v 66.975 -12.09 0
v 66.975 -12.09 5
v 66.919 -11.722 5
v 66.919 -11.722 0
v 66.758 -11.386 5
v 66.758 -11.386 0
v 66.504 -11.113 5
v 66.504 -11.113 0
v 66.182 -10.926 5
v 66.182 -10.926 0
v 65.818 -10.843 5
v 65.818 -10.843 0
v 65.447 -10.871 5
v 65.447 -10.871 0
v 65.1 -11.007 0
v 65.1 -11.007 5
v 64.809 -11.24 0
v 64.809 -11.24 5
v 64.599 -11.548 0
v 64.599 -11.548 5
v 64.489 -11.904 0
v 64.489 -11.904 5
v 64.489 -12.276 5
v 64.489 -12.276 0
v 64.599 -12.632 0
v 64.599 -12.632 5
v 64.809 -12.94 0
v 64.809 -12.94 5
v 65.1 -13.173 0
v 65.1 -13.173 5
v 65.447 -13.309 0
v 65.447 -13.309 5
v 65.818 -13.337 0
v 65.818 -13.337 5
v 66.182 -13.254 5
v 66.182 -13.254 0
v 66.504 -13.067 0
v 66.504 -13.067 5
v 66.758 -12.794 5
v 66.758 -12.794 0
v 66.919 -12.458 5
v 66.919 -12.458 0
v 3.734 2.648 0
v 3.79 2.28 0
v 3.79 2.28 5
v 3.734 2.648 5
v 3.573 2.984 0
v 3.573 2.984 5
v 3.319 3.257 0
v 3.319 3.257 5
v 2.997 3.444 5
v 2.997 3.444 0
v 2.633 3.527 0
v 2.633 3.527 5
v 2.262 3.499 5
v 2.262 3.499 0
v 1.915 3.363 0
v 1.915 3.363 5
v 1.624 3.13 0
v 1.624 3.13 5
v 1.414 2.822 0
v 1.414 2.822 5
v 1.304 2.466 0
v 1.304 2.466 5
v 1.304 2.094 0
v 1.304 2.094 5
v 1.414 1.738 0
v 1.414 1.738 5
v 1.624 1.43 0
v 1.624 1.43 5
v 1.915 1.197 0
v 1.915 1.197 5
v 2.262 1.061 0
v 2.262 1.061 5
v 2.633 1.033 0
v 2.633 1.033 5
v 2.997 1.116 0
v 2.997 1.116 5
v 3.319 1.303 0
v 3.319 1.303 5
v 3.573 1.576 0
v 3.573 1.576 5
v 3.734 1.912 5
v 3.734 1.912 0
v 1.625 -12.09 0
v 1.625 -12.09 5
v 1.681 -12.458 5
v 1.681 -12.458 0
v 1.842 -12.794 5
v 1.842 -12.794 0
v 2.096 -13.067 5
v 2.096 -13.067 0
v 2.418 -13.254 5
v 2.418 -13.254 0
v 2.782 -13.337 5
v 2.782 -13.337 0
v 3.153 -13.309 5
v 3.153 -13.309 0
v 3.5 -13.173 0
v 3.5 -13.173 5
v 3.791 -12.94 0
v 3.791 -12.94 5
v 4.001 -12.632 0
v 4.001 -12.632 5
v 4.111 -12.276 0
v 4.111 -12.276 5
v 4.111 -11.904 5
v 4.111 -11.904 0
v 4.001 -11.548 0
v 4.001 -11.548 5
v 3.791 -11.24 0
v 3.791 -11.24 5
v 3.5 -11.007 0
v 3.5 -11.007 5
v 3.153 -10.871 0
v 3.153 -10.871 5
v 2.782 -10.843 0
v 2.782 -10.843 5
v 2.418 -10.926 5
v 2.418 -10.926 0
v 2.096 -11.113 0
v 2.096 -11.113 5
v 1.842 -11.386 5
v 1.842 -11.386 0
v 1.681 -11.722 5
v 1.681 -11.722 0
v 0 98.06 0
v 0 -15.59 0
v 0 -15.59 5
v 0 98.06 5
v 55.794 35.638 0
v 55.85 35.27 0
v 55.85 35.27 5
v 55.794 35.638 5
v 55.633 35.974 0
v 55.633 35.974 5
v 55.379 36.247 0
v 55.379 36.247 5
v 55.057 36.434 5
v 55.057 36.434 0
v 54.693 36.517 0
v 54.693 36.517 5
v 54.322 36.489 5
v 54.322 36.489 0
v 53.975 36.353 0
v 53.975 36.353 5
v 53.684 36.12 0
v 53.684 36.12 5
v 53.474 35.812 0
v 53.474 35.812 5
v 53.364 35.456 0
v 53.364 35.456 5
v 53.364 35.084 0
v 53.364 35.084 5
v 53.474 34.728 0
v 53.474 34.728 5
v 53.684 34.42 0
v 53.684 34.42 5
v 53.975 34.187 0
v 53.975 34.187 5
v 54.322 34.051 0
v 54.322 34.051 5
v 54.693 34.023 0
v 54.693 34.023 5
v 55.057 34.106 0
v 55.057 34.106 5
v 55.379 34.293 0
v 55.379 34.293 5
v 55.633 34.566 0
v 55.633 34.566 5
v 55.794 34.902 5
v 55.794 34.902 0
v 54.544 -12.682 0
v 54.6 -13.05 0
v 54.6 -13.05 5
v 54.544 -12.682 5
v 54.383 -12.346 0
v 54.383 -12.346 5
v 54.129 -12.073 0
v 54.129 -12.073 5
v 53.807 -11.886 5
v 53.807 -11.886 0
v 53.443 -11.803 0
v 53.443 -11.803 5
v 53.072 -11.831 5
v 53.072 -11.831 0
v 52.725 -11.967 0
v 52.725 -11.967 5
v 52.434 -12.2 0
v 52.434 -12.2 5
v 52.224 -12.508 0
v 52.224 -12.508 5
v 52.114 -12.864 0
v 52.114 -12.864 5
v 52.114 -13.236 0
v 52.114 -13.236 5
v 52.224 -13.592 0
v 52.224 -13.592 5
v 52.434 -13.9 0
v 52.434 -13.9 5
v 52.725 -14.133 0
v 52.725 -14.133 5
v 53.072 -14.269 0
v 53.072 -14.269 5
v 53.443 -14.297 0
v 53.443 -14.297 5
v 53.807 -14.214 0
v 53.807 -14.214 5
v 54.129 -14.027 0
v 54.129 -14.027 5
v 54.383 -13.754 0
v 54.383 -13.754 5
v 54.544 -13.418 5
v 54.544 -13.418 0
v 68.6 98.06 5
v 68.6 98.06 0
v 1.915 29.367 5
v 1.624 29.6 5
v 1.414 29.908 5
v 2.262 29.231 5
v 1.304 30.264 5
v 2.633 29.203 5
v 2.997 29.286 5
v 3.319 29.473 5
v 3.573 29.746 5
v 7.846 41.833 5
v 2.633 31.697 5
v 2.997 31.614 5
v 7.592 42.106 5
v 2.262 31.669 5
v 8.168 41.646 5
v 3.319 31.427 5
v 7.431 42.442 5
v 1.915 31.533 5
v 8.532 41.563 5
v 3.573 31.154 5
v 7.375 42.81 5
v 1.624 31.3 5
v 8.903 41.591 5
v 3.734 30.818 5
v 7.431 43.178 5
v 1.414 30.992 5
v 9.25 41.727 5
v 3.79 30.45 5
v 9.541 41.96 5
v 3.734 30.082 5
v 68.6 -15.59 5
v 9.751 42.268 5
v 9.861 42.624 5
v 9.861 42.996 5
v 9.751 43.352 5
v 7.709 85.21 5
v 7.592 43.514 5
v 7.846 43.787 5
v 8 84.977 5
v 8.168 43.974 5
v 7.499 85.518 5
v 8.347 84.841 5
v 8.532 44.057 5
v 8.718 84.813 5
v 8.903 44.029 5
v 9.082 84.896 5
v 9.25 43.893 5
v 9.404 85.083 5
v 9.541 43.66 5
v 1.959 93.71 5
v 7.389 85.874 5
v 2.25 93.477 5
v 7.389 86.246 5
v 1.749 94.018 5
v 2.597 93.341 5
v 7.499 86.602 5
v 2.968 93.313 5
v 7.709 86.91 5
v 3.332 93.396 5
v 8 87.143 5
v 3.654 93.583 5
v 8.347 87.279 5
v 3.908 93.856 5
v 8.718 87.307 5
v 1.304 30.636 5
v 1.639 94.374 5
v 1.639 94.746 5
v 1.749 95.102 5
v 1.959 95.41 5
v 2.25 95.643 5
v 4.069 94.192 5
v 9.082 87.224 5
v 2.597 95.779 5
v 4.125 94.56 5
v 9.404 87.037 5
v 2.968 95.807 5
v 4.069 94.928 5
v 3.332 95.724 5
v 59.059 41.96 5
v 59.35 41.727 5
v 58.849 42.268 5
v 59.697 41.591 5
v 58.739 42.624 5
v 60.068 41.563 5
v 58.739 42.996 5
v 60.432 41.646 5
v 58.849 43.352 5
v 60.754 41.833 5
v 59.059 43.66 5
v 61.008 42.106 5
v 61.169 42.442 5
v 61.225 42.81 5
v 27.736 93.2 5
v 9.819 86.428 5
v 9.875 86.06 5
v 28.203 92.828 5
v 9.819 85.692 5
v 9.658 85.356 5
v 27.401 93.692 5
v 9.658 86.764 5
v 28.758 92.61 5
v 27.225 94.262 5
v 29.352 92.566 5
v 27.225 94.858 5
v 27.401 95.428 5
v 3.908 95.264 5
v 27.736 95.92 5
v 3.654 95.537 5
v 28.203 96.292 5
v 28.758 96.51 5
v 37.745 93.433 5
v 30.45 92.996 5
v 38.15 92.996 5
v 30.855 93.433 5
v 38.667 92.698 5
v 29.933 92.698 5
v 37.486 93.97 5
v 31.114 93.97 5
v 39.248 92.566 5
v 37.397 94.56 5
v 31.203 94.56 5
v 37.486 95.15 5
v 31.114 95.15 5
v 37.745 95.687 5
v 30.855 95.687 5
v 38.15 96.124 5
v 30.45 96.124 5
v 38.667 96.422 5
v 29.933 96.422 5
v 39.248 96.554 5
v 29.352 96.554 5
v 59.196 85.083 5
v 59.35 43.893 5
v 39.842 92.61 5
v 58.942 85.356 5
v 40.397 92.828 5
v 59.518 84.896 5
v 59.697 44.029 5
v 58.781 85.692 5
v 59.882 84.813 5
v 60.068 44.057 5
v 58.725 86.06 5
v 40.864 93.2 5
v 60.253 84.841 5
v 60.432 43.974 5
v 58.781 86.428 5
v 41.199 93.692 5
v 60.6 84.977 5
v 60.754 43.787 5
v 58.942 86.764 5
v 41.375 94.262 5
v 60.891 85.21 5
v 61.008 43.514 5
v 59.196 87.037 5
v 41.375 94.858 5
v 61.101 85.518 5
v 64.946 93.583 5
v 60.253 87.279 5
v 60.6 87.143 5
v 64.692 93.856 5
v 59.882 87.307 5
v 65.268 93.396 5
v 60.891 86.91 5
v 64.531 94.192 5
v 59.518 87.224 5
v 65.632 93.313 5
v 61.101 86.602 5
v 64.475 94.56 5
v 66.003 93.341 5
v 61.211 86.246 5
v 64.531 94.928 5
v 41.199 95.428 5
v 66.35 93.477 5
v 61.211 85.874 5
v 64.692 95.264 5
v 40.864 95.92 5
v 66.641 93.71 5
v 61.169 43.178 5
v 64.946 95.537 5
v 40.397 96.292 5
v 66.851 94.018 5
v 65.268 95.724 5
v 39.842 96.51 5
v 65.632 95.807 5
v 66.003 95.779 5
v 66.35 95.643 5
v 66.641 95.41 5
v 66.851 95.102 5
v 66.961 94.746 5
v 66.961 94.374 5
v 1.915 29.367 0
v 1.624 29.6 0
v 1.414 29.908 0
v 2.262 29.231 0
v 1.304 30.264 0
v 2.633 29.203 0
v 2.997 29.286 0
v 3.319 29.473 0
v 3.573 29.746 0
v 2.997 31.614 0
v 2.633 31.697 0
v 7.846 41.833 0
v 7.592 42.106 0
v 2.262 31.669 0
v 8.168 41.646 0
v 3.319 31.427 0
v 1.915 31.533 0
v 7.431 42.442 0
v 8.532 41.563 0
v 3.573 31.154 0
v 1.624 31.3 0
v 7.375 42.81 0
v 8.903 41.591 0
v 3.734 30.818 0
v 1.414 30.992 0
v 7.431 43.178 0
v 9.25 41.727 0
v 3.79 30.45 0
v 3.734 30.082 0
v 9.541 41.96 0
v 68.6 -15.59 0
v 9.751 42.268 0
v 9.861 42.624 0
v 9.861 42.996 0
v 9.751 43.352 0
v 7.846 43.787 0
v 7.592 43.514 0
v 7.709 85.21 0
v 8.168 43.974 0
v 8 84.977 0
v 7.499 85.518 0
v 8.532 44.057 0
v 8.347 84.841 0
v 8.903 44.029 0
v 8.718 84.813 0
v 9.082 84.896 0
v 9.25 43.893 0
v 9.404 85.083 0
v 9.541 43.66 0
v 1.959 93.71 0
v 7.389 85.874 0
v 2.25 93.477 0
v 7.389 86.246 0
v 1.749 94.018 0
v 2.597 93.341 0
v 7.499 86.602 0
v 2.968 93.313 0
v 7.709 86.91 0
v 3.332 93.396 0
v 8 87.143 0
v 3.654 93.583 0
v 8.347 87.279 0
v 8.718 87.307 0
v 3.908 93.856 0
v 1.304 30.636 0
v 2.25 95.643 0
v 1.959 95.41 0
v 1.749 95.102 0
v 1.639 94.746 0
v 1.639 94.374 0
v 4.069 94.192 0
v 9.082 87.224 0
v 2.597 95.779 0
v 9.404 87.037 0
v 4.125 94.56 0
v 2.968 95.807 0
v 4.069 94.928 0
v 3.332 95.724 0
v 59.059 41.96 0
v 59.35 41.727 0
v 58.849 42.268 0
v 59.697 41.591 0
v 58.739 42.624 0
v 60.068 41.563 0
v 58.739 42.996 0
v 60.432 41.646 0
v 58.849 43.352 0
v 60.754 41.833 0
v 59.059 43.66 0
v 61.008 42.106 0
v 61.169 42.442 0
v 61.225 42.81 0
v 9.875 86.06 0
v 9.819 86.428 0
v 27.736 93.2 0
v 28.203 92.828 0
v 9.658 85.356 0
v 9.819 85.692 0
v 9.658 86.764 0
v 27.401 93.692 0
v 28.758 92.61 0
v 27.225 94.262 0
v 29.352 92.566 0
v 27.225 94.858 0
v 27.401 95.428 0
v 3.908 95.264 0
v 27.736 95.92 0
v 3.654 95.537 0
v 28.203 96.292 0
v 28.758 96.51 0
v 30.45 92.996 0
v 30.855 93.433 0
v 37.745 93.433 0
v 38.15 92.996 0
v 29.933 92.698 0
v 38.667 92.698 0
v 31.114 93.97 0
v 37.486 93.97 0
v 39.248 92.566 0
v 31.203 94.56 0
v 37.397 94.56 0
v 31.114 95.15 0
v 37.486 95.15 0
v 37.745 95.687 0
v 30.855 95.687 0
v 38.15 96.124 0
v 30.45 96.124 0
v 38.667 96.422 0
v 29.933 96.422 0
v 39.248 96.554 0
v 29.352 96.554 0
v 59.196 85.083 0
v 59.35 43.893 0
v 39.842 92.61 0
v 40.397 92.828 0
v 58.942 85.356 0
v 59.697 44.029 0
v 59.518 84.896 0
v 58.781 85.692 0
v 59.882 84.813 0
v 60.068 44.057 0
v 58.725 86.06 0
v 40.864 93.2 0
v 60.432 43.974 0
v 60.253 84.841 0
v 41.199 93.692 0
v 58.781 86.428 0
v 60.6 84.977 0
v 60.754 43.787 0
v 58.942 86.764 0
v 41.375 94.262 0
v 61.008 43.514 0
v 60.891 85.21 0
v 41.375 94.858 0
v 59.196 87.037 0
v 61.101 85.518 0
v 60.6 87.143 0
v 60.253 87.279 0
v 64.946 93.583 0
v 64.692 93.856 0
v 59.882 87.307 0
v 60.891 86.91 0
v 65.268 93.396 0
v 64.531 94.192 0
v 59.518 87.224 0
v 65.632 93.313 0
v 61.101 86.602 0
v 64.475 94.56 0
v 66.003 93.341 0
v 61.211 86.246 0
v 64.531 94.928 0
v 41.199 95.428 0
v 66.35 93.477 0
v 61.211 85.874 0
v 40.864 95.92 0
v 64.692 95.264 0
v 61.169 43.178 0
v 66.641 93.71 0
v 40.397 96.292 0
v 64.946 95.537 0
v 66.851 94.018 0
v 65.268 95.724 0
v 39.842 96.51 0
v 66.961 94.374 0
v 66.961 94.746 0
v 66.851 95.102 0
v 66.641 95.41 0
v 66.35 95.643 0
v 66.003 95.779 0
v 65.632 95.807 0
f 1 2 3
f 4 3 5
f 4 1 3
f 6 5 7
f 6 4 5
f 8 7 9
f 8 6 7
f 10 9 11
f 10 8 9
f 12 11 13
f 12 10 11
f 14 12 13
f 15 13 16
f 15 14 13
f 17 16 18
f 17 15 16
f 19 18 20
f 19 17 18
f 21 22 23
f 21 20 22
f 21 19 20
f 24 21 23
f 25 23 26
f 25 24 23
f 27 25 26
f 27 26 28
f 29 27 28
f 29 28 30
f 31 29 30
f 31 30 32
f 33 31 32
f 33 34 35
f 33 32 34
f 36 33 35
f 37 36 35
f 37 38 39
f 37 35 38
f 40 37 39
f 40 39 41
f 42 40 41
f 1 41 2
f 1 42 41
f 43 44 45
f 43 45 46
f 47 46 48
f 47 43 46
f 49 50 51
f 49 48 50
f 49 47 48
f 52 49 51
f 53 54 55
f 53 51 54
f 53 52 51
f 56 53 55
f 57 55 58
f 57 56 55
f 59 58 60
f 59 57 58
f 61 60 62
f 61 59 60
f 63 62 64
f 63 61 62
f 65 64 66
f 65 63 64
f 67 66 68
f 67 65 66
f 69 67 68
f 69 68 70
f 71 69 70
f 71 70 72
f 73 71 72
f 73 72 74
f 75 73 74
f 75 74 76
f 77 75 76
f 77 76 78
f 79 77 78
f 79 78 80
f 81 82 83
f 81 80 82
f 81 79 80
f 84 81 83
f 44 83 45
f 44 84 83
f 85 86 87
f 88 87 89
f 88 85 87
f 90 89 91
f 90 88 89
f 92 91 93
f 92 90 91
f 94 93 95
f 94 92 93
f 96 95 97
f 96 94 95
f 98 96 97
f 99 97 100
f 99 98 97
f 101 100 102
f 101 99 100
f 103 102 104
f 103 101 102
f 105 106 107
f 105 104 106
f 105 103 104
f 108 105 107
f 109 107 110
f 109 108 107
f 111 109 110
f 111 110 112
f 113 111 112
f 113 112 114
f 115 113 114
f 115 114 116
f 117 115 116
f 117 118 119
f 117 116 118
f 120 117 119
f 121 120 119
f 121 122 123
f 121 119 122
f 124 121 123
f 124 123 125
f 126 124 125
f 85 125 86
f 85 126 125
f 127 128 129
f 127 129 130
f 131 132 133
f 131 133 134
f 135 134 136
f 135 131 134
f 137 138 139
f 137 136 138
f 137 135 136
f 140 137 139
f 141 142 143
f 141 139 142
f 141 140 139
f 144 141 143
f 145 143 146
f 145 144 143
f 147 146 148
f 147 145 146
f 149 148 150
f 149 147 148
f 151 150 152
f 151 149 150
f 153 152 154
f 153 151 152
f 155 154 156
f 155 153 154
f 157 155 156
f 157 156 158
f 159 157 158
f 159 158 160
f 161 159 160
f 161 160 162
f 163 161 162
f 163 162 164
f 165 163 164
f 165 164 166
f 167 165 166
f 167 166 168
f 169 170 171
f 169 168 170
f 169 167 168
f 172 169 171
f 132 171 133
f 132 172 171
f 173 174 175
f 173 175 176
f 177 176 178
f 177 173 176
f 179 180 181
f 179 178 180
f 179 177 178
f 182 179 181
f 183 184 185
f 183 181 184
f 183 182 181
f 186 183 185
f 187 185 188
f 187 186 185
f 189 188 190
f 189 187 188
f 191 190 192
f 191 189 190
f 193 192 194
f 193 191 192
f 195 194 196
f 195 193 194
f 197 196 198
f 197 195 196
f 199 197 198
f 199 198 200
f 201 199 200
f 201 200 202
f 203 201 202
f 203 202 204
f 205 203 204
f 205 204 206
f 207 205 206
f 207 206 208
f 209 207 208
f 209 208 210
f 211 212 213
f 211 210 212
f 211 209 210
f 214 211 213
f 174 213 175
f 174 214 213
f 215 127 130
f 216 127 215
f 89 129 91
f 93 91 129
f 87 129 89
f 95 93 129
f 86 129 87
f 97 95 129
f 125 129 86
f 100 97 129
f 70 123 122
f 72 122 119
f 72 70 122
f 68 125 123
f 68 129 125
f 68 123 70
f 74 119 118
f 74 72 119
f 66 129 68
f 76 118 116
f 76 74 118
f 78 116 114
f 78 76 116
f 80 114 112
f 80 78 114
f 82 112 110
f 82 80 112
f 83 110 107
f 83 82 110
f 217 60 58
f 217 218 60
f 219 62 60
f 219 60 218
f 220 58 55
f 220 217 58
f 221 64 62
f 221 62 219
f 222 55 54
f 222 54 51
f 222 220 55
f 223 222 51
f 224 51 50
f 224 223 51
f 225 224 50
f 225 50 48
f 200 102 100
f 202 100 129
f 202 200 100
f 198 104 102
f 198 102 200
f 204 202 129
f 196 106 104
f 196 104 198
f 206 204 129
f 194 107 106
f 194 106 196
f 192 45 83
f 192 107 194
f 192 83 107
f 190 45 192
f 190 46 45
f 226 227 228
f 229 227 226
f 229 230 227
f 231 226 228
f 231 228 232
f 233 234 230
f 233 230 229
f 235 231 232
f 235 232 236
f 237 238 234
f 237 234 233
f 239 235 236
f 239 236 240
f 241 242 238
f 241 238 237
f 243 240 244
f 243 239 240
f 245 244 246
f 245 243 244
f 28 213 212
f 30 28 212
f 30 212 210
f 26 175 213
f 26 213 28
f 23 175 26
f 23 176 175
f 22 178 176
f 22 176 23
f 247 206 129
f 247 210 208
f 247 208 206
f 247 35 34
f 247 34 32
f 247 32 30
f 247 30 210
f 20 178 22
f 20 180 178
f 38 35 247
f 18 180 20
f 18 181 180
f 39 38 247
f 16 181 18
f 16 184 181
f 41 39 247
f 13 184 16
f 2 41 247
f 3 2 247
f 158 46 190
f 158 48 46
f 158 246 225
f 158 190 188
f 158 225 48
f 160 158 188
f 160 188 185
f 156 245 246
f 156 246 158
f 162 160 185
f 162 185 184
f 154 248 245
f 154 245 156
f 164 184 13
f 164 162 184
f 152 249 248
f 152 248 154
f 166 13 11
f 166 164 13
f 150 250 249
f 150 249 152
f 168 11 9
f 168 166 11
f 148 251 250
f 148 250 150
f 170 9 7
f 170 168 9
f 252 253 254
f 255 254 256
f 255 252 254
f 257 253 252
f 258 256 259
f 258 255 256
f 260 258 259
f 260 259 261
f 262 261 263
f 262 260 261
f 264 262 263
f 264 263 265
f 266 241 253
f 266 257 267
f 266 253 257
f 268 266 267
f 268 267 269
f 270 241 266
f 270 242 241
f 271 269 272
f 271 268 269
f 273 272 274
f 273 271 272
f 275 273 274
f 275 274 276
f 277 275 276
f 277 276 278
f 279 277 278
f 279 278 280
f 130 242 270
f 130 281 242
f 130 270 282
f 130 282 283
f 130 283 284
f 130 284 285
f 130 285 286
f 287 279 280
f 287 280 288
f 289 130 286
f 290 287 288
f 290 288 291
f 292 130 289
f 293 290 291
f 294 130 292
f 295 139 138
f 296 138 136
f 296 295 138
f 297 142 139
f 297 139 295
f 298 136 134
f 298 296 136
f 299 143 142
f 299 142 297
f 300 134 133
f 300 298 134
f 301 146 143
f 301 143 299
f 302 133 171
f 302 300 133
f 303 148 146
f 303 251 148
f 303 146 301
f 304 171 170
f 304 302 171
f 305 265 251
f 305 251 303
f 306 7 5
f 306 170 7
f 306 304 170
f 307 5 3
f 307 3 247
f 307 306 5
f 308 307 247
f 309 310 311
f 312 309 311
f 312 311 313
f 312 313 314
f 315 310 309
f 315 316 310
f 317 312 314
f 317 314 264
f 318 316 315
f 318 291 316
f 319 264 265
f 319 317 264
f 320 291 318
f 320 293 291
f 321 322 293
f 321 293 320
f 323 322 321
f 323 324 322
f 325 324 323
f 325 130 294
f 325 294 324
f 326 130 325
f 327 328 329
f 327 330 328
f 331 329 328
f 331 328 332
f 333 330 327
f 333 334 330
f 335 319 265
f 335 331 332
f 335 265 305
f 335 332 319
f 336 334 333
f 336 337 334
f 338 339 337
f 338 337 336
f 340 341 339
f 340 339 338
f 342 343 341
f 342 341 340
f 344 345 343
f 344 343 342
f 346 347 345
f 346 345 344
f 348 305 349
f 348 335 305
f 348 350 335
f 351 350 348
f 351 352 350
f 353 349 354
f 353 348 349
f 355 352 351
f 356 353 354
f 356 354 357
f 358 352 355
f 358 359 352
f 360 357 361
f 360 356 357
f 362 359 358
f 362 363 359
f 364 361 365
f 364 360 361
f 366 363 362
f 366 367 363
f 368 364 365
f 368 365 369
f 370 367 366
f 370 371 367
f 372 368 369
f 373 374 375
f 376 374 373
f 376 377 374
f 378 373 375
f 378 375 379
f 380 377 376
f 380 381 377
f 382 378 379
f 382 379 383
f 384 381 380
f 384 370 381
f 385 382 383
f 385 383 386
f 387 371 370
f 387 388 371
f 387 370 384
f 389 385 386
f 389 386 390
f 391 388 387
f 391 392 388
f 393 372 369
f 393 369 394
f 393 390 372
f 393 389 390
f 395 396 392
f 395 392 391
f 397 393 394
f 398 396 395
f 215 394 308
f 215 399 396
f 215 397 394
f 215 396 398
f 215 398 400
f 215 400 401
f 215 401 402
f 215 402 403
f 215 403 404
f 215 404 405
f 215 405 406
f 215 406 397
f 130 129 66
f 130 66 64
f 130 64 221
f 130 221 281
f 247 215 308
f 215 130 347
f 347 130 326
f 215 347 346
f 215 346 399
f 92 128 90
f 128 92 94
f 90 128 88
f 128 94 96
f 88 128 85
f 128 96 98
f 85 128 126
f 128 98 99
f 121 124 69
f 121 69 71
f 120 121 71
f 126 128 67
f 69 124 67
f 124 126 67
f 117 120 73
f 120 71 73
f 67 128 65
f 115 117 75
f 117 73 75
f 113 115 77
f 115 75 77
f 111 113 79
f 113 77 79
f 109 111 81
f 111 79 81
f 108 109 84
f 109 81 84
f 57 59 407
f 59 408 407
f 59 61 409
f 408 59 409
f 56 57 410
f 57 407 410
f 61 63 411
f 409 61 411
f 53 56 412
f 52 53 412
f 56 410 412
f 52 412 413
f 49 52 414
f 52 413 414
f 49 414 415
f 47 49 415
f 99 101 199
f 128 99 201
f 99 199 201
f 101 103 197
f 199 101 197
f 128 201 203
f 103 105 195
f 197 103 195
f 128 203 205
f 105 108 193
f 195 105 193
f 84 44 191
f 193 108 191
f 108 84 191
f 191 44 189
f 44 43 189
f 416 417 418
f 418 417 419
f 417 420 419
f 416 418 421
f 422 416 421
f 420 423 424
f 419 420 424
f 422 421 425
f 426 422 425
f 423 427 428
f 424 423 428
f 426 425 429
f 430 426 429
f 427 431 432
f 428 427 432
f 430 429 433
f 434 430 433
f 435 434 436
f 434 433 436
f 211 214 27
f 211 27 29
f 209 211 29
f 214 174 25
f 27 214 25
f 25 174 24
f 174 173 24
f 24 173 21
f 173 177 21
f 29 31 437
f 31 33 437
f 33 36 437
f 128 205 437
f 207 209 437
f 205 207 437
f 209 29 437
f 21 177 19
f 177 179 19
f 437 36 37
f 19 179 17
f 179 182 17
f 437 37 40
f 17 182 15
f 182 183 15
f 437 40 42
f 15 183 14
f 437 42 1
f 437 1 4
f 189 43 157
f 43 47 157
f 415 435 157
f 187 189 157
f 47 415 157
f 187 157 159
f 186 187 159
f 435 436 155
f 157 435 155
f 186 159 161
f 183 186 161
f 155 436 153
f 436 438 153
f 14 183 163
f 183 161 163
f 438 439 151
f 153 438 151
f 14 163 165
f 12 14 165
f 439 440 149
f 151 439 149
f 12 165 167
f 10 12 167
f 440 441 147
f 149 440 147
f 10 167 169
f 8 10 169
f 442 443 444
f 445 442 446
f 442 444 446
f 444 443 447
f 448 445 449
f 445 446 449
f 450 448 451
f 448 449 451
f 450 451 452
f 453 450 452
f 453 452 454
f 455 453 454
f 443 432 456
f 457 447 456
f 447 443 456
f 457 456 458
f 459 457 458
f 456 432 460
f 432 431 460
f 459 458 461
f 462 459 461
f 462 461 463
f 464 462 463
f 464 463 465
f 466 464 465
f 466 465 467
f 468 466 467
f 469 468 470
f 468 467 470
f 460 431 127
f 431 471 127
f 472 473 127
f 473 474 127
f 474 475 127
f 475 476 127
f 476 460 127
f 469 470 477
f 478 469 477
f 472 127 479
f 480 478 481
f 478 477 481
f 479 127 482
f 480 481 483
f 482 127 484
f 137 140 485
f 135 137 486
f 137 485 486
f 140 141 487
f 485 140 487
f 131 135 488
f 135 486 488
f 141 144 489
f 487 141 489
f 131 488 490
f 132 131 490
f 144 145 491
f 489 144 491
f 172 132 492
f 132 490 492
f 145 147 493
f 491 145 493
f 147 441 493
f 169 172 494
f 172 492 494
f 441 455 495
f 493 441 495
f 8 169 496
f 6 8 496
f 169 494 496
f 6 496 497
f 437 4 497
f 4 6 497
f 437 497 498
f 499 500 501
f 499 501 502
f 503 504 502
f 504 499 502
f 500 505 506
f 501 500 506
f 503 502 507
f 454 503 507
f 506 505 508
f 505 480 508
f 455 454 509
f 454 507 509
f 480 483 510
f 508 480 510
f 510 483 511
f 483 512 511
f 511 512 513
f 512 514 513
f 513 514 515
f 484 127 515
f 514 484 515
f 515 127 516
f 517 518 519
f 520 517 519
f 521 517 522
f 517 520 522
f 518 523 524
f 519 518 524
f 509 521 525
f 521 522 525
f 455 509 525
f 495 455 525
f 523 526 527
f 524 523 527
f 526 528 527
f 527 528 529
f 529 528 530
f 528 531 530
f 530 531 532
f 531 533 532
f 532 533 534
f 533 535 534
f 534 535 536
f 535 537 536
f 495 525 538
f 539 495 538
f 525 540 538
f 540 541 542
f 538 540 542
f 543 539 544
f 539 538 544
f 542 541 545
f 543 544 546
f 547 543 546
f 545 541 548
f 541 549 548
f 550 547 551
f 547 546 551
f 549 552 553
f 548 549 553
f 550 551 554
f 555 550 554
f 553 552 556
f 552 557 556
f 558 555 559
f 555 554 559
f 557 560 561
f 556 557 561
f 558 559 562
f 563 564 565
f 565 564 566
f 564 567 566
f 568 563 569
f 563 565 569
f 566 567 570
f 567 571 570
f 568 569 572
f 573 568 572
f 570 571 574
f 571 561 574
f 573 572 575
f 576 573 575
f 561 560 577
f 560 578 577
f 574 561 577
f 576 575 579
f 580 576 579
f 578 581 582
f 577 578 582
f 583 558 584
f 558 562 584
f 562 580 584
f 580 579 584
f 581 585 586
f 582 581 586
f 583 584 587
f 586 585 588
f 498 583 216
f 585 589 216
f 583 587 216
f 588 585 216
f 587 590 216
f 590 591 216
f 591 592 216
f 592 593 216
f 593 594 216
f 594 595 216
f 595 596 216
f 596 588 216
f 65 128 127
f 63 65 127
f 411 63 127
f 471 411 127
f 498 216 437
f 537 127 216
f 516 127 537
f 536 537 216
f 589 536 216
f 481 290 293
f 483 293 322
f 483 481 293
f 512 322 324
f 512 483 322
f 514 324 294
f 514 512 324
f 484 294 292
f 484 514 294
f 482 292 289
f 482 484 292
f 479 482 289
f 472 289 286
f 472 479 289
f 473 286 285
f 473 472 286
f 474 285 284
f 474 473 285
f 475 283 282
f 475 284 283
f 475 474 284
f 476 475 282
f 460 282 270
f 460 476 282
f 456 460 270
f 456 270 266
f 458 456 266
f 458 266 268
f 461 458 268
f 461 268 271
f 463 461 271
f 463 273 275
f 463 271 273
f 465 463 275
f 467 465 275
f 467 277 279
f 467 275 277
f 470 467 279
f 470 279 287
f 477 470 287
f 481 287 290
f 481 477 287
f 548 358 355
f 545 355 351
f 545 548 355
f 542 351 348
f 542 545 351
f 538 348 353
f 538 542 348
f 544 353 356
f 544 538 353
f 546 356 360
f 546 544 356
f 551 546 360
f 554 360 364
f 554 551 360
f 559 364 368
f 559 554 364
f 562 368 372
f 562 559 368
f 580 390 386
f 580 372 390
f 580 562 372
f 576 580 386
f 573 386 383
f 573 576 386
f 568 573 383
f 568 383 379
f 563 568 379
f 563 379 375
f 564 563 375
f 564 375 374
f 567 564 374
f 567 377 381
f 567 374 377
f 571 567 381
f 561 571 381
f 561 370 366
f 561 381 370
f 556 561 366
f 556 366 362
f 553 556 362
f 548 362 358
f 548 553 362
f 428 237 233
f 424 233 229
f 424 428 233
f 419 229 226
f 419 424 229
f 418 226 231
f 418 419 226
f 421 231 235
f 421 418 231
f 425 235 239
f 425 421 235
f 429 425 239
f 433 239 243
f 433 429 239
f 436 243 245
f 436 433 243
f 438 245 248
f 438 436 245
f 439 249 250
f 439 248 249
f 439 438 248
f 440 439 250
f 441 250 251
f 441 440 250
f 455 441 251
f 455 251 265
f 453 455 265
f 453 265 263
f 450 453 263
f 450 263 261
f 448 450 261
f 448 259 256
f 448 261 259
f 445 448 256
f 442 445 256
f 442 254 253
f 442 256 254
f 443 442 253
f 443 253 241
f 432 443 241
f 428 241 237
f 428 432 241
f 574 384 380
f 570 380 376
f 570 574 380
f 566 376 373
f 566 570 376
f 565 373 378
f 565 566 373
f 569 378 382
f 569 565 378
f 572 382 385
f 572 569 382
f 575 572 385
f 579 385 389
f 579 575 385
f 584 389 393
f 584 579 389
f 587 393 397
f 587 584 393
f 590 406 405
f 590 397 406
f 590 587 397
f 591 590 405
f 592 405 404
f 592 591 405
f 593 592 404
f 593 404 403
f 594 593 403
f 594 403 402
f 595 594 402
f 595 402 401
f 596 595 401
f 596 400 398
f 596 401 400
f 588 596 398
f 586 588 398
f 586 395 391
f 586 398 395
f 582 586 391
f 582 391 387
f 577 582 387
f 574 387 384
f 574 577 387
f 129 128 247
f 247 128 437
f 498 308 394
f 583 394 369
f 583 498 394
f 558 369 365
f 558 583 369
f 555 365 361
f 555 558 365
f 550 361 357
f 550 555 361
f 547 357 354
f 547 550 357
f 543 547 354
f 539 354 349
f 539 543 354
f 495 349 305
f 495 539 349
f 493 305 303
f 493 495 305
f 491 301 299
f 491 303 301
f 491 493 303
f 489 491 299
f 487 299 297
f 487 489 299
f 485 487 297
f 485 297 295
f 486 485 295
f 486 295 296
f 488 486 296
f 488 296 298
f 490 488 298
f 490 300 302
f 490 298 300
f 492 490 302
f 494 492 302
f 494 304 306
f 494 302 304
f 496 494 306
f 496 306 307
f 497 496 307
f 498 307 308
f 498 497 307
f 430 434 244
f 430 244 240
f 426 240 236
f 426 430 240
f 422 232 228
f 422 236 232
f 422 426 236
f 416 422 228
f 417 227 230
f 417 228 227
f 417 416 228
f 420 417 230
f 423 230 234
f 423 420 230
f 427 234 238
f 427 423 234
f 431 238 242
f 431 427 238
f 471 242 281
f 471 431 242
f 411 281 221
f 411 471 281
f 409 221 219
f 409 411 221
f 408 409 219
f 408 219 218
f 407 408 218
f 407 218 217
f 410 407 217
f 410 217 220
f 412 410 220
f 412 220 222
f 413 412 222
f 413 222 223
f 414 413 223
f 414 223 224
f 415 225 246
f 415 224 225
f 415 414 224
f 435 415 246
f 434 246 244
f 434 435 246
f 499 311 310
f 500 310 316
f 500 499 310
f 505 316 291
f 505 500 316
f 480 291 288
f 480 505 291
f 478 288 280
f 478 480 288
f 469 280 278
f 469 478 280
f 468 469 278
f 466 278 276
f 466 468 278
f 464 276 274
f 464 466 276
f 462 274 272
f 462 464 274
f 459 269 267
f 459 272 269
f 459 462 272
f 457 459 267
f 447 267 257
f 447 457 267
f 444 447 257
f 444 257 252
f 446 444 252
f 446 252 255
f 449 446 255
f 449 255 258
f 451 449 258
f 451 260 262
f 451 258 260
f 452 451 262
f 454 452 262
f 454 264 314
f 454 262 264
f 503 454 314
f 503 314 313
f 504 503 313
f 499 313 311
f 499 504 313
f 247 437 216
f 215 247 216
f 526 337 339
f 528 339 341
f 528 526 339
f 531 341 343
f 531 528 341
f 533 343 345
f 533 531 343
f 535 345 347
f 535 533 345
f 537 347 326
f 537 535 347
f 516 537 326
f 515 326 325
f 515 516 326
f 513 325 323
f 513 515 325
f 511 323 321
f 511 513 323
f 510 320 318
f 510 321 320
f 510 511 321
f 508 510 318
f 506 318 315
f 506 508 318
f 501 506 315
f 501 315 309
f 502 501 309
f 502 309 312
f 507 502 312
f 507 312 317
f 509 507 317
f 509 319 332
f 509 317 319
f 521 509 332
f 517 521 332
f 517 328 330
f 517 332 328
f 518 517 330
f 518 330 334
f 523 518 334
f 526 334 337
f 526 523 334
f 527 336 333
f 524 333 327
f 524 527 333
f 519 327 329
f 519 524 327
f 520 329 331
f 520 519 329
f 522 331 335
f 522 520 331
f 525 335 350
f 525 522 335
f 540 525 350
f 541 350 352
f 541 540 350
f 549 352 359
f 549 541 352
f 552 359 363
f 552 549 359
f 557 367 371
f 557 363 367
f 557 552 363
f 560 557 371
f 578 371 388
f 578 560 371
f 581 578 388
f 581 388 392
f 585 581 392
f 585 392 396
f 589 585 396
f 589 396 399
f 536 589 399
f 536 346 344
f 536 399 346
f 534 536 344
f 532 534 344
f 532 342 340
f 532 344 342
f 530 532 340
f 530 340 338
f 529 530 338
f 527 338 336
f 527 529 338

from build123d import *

# Parameters (mm, degrees)
SKETCH1_W                        = 68.600000001
SKETCH1_H                        = 113.65
BRACKETBASE_DEPTH                = 5
ARDUINOMOUNTINGHOLES_DEPTH       = 22
ARDUINOMOUNTINGHOLES_DEPTH_BACK  = 120.777809299
ARDUINOMOUNTINGHOLESSKETCH_R     = 1.25
F_9VBATTERYMOUNTINGHOLESSKETCH_R = 1.25
F_9VBATTERYMOUNTINGHOLES_DEPTH   = 20
LEGBRACKETMOUNTINGHOLESSKETCH_R  = 2
LEGBRACKETMOUNTINGHOLES_DEPTH    = 13
BACKSIDEMOUNTINGHOLESSKETCH_R    = 1.25
BACKSIDEMOUNTINGHOLES_DEPTH      = 24


with BuildPart() as part:
    # Sketch1 → bracketBase (new body)
    with BuildSketch(Plane.XY):
        with Locations((34.3, 41.235000001)):
            Rectangle(SKETCH1_W, SKETCH1_H)
    extrude(amount=BRACKETBASE_DEPTH)

    # arduinoMountingHolesSketch → arduinoMountingHoles (cut, two sides: drawn at the far end of the back side and taken through both)
    with BuildSketch(Plane.XY.offset(-ARDUINOMOUNTINGHOLES_DEPTH_BACK)):
        with Locations((2.54, 2.280000001)):
            Circle(ARDUINOMOUNTINGHOLESSKETCH_R)
        with Locations((2.54, 30.450000001)):
            Circle(ARDUINOMOUNTINGHOLESSKETCH_R)
        with Locations((54.600000001, 35.270000001)):
            Circle(ARDUINOMOUNTINGHOLESSKETCH_R)
        with Locations((53.350000001, -13.049999999)):
            Circle(ARDUINOMOUNTINGHOLESSKETCH_R)
    extrude(amount=ARDUINOMOUNTINGHOLES_DEPTH + ARDUINOMOUNTINGHOLES_DEPTH_BACK, mode=Mode.SUBTRACT)

    # 9VbatteryMountingHolesSketch → 9VbatteryMountingHoles (cut)
    with BuildSketch(Plane.XY):
        with Locations((8.625000001, 86.060000001)):
            Circle(F_9VBATTERYMOUNTINGHOLESSKETCH_R)
        with Locations(Location((59.975000001, 86.060000001, 0), (0, 0, 180))):
            Circle(F_9VBATTERYMOUNTINGHOLESSKETCH_R)
        with Locations(Location((8.625000001, 42.810000001, 0), (0, 0, 180))):
            Circle(F_9VBATTERYMOUNTINGHOLESSKETCH_R)
        with Locations((59.975000001, 42.810000001)):
            Circle(F_9VBATTERYMOUNTINGHOLESSKETCH_R)
    extrude(amount=F_9VBATTERYMOUNTINGHOLES_DEPTH, mode=Mode.SUBTRACT)

    # legBracketMountingHolesSketch → legBracketMountingHoles (cut)
    with BuildSketch(Plane.XY):
        with Locations((29.202551646, 94.560000001)):
            Circle(LEGBRACKETMOUNTINGHOLESSKETCH_R)
        with Locations(Location((39.397448356, 94.560000001, 0), (0, 0, 180))):
            Circle(LEGBRACKETMOUNTINGHOLESSKETCH_R)
    extrude(amount=LEGBRACKETMOUNTINGHOLES_DEPTH, mode=Mode.SUBTRACT)

    # backsideMountingHolesSketch → backsideMountingHoles (cut)
    with BuildSketch(Plane.XY):
        with Locations((2.875000001, 94.560000001)):
            Circle(BACKSIDEMOUNTINGHOLESSKETCH_R)
        with Locations(Location((65.725000001, 94.560000001, 0), (0, 0, 180))):
            Circle(BACKSIDEMOUNTINGHOLESSKETCH_R)
        with Locations((65.725000001, -12.089999999)):
            Circle(BACKSIDEMOUNTINGHOLESSKETCH_R)
        with Locations(Location((2.875000001, -12.089999999, 0), (0, 0, 180))):
            Circle(BACKSIDEMOUNTINGHOLESSKETCH_R)
    extrude(amount=BACKSIDEMOUNTINGHOLES_DEPTH, mode=Mode.SUBTRACT)


solid = part.part
